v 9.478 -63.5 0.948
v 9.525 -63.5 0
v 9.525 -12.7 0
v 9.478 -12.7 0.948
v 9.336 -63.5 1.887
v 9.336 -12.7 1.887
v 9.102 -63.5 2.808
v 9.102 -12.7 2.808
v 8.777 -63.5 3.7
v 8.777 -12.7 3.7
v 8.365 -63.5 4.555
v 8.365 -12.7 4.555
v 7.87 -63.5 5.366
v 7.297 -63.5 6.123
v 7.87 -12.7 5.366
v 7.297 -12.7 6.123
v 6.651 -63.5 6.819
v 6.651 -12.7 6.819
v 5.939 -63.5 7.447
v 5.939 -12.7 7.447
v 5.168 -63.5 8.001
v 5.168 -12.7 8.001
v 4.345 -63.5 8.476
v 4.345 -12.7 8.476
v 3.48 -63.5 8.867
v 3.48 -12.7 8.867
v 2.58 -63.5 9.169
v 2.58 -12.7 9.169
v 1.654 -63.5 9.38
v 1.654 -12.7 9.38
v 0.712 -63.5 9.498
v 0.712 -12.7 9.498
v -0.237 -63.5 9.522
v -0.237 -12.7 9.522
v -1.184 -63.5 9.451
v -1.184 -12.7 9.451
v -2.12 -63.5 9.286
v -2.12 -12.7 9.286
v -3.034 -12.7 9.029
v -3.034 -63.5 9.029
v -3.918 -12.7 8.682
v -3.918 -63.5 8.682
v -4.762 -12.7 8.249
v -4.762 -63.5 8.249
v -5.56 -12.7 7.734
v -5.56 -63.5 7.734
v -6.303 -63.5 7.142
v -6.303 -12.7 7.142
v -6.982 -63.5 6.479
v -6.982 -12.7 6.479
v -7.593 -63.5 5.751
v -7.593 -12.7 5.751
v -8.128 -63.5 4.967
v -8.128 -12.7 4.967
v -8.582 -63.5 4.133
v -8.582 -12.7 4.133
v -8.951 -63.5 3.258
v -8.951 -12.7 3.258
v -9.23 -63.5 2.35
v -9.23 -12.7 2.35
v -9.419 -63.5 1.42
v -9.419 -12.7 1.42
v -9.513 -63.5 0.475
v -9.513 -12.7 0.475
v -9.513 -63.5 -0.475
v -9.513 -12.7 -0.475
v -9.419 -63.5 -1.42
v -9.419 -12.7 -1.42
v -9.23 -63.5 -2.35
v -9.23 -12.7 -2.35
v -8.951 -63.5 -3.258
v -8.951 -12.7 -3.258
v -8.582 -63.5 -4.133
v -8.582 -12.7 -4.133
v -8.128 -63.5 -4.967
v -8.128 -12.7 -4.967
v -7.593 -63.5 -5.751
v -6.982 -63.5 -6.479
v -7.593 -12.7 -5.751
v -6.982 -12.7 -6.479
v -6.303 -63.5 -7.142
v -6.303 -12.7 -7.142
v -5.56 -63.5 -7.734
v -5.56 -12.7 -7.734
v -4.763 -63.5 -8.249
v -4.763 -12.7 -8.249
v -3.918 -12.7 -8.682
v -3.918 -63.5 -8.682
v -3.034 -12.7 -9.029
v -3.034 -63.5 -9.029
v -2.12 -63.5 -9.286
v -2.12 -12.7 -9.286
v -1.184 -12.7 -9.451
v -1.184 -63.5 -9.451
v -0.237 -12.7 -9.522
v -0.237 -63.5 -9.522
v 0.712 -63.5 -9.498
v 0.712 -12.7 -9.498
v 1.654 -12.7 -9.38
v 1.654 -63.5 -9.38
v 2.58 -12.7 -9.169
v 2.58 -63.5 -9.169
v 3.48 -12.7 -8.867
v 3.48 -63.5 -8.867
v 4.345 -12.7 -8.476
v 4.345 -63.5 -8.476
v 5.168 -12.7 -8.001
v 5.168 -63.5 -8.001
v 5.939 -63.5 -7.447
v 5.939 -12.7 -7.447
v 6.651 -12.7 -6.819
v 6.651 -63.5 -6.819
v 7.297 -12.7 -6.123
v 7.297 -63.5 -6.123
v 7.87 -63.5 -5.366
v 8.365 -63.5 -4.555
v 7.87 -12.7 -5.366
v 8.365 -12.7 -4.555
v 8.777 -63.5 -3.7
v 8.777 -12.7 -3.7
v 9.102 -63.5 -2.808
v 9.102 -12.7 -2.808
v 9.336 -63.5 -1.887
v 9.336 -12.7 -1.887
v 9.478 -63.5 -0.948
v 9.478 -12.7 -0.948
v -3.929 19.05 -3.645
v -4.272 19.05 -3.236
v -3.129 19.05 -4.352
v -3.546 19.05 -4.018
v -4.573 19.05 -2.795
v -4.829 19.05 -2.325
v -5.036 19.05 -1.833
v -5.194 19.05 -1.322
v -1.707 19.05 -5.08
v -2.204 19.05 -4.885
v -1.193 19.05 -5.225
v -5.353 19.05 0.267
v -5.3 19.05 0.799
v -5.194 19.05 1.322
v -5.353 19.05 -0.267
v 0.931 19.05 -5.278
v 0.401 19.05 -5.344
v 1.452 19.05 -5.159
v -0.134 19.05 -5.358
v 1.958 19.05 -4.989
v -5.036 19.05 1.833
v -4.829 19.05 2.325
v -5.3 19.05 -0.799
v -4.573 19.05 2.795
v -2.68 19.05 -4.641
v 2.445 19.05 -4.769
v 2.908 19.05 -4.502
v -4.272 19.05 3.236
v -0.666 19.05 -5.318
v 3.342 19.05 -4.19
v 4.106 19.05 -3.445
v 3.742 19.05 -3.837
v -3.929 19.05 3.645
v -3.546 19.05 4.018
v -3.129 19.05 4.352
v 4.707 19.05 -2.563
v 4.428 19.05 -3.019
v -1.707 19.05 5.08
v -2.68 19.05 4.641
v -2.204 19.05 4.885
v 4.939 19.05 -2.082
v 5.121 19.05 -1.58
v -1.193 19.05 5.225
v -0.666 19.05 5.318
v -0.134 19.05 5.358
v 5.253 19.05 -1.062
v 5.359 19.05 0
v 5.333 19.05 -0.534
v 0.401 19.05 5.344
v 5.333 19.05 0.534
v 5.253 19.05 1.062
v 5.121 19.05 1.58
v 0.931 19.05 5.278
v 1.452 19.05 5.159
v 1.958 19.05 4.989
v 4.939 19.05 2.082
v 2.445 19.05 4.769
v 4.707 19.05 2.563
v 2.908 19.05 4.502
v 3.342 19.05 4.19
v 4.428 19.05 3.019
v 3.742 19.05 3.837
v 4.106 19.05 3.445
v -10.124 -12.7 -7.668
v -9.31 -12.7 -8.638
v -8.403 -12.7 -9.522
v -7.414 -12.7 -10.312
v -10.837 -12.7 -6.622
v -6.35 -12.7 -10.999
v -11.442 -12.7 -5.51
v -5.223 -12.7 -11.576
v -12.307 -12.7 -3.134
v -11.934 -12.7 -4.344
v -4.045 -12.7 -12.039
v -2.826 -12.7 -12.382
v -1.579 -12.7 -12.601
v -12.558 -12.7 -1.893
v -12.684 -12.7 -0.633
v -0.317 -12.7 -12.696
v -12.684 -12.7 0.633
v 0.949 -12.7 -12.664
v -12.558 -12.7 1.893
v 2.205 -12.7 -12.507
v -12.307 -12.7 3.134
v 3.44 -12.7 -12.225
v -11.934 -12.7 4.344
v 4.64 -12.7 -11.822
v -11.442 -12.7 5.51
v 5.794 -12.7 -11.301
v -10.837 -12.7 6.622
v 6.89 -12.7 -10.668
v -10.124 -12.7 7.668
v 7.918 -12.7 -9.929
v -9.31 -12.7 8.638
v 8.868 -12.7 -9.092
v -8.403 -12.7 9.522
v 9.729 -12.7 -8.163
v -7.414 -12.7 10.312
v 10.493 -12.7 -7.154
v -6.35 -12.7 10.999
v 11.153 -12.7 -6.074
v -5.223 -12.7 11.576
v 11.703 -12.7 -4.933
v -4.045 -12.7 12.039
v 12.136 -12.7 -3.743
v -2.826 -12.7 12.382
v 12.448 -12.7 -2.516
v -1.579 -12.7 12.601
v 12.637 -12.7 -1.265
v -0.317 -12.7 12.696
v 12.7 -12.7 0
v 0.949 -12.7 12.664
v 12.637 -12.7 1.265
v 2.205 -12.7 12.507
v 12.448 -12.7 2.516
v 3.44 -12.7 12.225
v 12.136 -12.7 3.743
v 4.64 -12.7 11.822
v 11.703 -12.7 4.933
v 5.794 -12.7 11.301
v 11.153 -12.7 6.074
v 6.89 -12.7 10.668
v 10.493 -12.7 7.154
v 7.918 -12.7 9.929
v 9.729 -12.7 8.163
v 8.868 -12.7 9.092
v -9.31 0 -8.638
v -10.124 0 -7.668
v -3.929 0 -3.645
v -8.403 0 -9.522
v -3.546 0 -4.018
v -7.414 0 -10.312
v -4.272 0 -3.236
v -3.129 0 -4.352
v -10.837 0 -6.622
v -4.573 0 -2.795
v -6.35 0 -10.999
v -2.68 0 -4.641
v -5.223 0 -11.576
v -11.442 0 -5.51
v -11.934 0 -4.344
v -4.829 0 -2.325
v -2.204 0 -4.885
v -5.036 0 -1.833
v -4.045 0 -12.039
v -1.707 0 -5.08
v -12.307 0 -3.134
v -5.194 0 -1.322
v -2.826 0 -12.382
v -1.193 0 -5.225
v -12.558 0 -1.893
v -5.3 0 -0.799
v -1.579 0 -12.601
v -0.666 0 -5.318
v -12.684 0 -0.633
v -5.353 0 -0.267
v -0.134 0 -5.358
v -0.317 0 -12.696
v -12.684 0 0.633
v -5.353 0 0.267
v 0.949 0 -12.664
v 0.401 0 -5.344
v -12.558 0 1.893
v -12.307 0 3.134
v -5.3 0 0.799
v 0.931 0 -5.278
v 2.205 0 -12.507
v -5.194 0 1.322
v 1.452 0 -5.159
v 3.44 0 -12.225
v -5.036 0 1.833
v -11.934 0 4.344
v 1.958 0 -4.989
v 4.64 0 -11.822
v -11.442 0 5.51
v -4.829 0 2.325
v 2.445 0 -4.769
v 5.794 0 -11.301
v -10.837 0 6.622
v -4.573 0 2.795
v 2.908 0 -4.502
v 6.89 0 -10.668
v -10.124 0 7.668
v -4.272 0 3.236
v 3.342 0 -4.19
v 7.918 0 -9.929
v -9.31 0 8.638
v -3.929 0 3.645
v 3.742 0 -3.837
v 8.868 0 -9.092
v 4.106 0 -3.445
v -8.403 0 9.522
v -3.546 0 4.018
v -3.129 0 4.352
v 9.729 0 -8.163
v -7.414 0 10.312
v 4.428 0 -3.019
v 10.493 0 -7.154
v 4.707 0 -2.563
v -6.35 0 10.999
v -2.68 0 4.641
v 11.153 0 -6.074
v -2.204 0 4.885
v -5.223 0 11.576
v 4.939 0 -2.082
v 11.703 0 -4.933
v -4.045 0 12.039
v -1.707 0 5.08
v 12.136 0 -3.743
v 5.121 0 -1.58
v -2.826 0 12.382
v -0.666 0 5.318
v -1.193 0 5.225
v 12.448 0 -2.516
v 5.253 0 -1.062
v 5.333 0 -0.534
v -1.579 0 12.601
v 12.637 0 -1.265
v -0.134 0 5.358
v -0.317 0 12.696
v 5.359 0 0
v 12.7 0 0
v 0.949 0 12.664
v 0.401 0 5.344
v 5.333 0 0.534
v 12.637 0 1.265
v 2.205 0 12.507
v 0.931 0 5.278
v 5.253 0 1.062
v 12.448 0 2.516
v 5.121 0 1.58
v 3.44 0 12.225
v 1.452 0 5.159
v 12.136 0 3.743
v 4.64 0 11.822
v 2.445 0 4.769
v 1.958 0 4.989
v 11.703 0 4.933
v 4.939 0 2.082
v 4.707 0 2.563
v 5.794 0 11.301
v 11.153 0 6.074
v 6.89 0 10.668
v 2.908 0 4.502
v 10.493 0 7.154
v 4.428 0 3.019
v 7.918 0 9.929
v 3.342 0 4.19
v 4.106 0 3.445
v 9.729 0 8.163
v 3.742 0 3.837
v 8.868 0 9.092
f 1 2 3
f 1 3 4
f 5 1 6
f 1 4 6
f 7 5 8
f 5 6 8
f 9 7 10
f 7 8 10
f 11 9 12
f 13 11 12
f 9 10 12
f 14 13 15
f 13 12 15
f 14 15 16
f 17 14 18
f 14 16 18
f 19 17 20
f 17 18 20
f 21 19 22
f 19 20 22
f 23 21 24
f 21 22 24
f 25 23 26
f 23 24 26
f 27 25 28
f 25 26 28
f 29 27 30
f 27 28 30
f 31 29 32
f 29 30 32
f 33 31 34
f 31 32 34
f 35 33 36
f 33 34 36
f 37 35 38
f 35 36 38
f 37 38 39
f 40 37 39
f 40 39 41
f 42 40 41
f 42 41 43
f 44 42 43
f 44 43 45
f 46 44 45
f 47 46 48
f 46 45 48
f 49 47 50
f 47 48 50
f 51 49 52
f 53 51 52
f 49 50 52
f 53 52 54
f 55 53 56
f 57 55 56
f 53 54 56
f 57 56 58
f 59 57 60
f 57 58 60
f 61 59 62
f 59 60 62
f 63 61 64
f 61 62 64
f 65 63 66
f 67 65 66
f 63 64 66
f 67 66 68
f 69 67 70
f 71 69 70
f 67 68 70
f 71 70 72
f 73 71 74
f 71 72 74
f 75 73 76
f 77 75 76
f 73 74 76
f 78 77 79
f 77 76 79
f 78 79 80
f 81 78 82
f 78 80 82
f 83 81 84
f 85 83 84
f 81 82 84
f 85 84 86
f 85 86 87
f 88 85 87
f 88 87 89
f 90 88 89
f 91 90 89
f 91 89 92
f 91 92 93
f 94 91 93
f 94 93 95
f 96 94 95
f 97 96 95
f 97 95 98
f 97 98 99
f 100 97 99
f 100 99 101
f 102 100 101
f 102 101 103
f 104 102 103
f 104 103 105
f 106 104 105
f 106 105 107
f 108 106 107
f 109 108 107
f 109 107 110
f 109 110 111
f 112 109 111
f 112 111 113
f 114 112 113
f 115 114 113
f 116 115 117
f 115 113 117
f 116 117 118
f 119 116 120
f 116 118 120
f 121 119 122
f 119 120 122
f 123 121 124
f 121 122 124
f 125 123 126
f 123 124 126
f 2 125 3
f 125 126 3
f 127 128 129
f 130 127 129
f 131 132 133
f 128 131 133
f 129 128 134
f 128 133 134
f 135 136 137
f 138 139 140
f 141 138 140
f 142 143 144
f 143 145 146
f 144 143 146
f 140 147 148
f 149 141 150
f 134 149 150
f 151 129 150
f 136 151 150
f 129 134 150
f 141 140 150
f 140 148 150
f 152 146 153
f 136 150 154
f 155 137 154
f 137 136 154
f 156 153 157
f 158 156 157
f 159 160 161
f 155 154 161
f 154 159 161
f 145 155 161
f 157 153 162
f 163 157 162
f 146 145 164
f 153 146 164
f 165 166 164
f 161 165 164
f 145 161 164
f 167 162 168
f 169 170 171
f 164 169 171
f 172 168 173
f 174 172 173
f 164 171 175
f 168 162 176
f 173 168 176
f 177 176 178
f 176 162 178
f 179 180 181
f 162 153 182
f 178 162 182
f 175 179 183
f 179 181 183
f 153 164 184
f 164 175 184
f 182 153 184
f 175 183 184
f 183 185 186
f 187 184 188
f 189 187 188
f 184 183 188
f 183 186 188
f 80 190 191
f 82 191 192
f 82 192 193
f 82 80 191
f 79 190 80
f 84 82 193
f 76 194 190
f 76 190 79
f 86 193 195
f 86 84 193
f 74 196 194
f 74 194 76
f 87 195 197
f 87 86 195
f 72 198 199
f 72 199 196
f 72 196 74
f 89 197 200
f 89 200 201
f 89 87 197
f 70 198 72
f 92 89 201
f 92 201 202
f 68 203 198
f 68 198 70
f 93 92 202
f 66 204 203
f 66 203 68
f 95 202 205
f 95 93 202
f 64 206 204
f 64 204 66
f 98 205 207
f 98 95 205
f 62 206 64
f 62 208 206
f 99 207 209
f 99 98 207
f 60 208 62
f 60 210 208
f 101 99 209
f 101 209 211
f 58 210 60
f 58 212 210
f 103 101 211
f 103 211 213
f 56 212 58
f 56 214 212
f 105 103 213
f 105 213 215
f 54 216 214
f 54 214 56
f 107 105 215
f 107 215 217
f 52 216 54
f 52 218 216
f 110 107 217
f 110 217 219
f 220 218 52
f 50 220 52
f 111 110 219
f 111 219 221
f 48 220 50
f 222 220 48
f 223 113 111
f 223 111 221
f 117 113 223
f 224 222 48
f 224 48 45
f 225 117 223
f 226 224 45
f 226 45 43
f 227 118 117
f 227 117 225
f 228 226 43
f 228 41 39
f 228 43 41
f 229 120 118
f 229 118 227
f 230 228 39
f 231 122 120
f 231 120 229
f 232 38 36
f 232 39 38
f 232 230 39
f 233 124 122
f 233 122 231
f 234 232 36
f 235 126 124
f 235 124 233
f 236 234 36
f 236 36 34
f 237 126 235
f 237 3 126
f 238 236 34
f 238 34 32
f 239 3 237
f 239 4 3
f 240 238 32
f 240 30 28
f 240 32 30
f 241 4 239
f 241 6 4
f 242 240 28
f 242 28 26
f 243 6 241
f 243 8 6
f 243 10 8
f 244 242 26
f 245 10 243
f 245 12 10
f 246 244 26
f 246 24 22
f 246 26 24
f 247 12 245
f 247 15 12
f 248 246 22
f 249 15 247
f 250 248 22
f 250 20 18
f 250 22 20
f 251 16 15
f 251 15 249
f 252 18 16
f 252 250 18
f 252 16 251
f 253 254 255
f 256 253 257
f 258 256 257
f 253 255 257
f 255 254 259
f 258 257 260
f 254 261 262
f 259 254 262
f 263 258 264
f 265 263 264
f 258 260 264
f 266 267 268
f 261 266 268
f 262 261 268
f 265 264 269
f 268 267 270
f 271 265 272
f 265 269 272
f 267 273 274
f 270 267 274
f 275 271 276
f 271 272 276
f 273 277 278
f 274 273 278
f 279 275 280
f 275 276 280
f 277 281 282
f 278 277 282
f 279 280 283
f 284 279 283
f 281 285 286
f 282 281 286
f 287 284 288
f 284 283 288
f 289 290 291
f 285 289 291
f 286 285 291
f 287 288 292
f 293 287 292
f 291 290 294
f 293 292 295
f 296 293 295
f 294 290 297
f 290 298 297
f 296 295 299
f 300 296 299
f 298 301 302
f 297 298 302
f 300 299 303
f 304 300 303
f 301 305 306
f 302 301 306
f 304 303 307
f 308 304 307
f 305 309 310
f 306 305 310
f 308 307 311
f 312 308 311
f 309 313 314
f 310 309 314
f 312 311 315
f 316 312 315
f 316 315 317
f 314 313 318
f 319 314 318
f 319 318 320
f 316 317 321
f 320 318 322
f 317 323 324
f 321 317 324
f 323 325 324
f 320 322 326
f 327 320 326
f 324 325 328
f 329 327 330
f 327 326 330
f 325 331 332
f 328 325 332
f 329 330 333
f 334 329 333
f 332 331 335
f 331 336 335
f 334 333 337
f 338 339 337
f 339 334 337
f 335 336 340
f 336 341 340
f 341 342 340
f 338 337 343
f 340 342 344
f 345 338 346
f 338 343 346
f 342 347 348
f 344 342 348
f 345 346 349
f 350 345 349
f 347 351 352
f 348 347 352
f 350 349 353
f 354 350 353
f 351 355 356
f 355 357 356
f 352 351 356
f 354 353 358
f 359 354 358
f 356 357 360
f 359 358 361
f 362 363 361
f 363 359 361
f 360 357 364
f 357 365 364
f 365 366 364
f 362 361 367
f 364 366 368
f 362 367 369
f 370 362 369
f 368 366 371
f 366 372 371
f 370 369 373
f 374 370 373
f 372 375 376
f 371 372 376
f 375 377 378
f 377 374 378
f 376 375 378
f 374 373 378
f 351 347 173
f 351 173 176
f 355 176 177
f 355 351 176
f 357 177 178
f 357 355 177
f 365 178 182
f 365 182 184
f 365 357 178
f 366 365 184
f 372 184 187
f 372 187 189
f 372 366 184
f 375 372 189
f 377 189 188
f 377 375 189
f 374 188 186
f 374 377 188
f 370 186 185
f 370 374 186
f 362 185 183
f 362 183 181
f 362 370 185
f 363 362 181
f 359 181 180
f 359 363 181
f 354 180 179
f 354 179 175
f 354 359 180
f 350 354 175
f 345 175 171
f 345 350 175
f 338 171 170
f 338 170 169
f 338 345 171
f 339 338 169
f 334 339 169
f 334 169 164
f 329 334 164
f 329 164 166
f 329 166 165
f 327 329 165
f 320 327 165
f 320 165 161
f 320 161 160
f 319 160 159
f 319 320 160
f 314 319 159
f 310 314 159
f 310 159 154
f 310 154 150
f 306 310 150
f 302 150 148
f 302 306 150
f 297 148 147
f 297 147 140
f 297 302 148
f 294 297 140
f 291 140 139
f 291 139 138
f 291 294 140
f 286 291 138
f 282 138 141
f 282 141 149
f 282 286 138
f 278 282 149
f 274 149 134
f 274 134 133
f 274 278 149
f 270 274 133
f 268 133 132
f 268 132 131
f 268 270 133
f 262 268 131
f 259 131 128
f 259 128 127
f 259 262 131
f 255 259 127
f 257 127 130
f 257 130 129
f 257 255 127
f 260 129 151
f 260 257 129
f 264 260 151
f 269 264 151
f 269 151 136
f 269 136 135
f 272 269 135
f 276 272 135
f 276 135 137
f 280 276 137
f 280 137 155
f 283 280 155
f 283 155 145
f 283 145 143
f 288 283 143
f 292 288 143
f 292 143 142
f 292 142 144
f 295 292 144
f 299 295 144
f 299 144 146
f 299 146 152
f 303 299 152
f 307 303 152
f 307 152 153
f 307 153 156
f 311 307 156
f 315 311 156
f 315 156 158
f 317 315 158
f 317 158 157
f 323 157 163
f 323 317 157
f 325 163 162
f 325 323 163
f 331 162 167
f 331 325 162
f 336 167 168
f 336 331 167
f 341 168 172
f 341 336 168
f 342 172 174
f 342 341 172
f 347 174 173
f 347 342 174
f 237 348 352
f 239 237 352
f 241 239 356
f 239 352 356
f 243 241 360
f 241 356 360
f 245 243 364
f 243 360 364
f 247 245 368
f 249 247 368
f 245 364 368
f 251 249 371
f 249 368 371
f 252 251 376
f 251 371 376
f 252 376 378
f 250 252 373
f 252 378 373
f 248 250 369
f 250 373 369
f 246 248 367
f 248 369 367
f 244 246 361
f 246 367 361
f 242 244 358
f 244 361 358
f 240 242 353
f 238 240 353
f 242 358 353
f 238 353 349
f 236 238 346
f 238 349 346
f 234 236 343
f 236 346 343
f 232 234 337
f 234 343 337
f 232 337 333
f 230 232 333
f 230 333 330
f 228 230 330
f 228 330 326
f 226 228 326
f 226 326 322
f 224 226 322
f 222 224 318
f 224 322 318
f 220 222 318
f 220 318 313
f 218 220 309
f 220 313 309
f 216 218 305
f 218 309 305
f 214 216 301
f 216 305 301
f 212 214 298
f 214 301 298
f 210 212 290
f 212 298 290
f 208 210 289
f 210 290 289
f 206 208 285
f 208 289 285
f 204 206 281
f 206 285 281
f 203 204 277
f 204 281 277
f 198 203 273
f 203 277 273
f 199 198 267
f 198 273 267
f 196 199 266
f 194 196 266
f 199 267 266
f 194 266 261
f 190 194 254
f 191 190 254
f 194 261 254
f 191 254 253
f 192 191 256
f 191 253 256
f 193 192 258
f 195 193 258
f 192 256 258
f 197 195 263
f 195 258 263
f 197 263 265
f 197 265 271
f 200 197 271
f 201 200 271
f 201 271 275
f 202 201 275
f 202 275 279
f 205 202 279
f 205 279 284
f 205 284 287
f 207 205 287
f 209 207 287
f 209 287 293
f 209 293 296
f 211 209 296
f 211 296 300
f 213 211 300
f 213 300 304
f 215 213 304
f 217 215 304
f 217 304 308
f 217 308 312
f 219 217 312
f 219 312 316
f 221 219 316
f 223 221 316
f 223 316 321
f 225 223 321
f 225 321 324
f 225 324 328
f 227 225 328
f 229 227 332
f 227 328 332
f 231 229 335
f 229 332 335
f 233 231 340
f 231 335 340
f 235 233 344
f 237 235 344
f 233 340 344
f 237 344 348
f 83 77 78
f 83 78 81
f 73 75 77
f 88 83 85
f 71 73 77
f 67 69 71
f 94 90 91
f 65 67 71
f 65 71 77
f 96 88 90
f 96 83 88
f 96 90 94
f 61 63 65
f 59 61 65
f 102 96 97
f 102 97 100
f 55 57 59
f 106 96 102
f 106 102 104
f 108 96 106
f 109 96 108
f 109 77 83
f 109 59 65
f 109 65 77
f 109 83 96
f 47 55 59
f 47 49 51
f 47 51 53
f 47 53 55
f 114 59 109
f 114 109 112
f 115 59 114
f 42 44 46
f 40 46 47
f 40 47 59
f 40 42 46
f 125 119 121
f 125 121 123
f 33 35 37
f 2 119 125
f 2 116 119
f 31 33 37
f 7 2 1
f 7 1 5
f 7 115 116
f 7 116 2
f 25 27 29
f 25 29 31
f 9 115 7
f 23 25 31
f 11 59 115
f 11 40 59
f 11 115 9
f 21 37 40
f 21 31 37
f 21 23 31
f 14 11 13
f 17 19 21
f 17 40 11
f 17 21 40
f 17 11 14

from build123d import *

# Parameters (mm, degrees)
F0_R     = 12.7
F0_R_2   = 5.3594
F1_DEPTH = 12.7
F2_DEPTH = 19.05
F3_R     = 9.525
F4_DEPTH = 50.8


with BuildPart() as f1:
    # F0 (on Front) → F1 (new body)
    with BuildSketch(Plane.XZ):
        Circle(F0_R)
        Circle(F0_R_2, mode=Mode.SUBTRACT)
        Circle(F0_R_2)
    extrude(amount=F1_DEPTH)

    # F0 (on Front) → F2 (join)
    with BuildSketch(Plane.XZ):
        Circle(F0_R_2)
    extrude(amount=-F2_DEPTH)

    # F3 (on face) → F4 (join)
    with BuildSketch(Plane.XZ.offset(12.7)):
        Circle(F3_R)
    extrude(amount=F4_DEPTH)


solid = f1.part
